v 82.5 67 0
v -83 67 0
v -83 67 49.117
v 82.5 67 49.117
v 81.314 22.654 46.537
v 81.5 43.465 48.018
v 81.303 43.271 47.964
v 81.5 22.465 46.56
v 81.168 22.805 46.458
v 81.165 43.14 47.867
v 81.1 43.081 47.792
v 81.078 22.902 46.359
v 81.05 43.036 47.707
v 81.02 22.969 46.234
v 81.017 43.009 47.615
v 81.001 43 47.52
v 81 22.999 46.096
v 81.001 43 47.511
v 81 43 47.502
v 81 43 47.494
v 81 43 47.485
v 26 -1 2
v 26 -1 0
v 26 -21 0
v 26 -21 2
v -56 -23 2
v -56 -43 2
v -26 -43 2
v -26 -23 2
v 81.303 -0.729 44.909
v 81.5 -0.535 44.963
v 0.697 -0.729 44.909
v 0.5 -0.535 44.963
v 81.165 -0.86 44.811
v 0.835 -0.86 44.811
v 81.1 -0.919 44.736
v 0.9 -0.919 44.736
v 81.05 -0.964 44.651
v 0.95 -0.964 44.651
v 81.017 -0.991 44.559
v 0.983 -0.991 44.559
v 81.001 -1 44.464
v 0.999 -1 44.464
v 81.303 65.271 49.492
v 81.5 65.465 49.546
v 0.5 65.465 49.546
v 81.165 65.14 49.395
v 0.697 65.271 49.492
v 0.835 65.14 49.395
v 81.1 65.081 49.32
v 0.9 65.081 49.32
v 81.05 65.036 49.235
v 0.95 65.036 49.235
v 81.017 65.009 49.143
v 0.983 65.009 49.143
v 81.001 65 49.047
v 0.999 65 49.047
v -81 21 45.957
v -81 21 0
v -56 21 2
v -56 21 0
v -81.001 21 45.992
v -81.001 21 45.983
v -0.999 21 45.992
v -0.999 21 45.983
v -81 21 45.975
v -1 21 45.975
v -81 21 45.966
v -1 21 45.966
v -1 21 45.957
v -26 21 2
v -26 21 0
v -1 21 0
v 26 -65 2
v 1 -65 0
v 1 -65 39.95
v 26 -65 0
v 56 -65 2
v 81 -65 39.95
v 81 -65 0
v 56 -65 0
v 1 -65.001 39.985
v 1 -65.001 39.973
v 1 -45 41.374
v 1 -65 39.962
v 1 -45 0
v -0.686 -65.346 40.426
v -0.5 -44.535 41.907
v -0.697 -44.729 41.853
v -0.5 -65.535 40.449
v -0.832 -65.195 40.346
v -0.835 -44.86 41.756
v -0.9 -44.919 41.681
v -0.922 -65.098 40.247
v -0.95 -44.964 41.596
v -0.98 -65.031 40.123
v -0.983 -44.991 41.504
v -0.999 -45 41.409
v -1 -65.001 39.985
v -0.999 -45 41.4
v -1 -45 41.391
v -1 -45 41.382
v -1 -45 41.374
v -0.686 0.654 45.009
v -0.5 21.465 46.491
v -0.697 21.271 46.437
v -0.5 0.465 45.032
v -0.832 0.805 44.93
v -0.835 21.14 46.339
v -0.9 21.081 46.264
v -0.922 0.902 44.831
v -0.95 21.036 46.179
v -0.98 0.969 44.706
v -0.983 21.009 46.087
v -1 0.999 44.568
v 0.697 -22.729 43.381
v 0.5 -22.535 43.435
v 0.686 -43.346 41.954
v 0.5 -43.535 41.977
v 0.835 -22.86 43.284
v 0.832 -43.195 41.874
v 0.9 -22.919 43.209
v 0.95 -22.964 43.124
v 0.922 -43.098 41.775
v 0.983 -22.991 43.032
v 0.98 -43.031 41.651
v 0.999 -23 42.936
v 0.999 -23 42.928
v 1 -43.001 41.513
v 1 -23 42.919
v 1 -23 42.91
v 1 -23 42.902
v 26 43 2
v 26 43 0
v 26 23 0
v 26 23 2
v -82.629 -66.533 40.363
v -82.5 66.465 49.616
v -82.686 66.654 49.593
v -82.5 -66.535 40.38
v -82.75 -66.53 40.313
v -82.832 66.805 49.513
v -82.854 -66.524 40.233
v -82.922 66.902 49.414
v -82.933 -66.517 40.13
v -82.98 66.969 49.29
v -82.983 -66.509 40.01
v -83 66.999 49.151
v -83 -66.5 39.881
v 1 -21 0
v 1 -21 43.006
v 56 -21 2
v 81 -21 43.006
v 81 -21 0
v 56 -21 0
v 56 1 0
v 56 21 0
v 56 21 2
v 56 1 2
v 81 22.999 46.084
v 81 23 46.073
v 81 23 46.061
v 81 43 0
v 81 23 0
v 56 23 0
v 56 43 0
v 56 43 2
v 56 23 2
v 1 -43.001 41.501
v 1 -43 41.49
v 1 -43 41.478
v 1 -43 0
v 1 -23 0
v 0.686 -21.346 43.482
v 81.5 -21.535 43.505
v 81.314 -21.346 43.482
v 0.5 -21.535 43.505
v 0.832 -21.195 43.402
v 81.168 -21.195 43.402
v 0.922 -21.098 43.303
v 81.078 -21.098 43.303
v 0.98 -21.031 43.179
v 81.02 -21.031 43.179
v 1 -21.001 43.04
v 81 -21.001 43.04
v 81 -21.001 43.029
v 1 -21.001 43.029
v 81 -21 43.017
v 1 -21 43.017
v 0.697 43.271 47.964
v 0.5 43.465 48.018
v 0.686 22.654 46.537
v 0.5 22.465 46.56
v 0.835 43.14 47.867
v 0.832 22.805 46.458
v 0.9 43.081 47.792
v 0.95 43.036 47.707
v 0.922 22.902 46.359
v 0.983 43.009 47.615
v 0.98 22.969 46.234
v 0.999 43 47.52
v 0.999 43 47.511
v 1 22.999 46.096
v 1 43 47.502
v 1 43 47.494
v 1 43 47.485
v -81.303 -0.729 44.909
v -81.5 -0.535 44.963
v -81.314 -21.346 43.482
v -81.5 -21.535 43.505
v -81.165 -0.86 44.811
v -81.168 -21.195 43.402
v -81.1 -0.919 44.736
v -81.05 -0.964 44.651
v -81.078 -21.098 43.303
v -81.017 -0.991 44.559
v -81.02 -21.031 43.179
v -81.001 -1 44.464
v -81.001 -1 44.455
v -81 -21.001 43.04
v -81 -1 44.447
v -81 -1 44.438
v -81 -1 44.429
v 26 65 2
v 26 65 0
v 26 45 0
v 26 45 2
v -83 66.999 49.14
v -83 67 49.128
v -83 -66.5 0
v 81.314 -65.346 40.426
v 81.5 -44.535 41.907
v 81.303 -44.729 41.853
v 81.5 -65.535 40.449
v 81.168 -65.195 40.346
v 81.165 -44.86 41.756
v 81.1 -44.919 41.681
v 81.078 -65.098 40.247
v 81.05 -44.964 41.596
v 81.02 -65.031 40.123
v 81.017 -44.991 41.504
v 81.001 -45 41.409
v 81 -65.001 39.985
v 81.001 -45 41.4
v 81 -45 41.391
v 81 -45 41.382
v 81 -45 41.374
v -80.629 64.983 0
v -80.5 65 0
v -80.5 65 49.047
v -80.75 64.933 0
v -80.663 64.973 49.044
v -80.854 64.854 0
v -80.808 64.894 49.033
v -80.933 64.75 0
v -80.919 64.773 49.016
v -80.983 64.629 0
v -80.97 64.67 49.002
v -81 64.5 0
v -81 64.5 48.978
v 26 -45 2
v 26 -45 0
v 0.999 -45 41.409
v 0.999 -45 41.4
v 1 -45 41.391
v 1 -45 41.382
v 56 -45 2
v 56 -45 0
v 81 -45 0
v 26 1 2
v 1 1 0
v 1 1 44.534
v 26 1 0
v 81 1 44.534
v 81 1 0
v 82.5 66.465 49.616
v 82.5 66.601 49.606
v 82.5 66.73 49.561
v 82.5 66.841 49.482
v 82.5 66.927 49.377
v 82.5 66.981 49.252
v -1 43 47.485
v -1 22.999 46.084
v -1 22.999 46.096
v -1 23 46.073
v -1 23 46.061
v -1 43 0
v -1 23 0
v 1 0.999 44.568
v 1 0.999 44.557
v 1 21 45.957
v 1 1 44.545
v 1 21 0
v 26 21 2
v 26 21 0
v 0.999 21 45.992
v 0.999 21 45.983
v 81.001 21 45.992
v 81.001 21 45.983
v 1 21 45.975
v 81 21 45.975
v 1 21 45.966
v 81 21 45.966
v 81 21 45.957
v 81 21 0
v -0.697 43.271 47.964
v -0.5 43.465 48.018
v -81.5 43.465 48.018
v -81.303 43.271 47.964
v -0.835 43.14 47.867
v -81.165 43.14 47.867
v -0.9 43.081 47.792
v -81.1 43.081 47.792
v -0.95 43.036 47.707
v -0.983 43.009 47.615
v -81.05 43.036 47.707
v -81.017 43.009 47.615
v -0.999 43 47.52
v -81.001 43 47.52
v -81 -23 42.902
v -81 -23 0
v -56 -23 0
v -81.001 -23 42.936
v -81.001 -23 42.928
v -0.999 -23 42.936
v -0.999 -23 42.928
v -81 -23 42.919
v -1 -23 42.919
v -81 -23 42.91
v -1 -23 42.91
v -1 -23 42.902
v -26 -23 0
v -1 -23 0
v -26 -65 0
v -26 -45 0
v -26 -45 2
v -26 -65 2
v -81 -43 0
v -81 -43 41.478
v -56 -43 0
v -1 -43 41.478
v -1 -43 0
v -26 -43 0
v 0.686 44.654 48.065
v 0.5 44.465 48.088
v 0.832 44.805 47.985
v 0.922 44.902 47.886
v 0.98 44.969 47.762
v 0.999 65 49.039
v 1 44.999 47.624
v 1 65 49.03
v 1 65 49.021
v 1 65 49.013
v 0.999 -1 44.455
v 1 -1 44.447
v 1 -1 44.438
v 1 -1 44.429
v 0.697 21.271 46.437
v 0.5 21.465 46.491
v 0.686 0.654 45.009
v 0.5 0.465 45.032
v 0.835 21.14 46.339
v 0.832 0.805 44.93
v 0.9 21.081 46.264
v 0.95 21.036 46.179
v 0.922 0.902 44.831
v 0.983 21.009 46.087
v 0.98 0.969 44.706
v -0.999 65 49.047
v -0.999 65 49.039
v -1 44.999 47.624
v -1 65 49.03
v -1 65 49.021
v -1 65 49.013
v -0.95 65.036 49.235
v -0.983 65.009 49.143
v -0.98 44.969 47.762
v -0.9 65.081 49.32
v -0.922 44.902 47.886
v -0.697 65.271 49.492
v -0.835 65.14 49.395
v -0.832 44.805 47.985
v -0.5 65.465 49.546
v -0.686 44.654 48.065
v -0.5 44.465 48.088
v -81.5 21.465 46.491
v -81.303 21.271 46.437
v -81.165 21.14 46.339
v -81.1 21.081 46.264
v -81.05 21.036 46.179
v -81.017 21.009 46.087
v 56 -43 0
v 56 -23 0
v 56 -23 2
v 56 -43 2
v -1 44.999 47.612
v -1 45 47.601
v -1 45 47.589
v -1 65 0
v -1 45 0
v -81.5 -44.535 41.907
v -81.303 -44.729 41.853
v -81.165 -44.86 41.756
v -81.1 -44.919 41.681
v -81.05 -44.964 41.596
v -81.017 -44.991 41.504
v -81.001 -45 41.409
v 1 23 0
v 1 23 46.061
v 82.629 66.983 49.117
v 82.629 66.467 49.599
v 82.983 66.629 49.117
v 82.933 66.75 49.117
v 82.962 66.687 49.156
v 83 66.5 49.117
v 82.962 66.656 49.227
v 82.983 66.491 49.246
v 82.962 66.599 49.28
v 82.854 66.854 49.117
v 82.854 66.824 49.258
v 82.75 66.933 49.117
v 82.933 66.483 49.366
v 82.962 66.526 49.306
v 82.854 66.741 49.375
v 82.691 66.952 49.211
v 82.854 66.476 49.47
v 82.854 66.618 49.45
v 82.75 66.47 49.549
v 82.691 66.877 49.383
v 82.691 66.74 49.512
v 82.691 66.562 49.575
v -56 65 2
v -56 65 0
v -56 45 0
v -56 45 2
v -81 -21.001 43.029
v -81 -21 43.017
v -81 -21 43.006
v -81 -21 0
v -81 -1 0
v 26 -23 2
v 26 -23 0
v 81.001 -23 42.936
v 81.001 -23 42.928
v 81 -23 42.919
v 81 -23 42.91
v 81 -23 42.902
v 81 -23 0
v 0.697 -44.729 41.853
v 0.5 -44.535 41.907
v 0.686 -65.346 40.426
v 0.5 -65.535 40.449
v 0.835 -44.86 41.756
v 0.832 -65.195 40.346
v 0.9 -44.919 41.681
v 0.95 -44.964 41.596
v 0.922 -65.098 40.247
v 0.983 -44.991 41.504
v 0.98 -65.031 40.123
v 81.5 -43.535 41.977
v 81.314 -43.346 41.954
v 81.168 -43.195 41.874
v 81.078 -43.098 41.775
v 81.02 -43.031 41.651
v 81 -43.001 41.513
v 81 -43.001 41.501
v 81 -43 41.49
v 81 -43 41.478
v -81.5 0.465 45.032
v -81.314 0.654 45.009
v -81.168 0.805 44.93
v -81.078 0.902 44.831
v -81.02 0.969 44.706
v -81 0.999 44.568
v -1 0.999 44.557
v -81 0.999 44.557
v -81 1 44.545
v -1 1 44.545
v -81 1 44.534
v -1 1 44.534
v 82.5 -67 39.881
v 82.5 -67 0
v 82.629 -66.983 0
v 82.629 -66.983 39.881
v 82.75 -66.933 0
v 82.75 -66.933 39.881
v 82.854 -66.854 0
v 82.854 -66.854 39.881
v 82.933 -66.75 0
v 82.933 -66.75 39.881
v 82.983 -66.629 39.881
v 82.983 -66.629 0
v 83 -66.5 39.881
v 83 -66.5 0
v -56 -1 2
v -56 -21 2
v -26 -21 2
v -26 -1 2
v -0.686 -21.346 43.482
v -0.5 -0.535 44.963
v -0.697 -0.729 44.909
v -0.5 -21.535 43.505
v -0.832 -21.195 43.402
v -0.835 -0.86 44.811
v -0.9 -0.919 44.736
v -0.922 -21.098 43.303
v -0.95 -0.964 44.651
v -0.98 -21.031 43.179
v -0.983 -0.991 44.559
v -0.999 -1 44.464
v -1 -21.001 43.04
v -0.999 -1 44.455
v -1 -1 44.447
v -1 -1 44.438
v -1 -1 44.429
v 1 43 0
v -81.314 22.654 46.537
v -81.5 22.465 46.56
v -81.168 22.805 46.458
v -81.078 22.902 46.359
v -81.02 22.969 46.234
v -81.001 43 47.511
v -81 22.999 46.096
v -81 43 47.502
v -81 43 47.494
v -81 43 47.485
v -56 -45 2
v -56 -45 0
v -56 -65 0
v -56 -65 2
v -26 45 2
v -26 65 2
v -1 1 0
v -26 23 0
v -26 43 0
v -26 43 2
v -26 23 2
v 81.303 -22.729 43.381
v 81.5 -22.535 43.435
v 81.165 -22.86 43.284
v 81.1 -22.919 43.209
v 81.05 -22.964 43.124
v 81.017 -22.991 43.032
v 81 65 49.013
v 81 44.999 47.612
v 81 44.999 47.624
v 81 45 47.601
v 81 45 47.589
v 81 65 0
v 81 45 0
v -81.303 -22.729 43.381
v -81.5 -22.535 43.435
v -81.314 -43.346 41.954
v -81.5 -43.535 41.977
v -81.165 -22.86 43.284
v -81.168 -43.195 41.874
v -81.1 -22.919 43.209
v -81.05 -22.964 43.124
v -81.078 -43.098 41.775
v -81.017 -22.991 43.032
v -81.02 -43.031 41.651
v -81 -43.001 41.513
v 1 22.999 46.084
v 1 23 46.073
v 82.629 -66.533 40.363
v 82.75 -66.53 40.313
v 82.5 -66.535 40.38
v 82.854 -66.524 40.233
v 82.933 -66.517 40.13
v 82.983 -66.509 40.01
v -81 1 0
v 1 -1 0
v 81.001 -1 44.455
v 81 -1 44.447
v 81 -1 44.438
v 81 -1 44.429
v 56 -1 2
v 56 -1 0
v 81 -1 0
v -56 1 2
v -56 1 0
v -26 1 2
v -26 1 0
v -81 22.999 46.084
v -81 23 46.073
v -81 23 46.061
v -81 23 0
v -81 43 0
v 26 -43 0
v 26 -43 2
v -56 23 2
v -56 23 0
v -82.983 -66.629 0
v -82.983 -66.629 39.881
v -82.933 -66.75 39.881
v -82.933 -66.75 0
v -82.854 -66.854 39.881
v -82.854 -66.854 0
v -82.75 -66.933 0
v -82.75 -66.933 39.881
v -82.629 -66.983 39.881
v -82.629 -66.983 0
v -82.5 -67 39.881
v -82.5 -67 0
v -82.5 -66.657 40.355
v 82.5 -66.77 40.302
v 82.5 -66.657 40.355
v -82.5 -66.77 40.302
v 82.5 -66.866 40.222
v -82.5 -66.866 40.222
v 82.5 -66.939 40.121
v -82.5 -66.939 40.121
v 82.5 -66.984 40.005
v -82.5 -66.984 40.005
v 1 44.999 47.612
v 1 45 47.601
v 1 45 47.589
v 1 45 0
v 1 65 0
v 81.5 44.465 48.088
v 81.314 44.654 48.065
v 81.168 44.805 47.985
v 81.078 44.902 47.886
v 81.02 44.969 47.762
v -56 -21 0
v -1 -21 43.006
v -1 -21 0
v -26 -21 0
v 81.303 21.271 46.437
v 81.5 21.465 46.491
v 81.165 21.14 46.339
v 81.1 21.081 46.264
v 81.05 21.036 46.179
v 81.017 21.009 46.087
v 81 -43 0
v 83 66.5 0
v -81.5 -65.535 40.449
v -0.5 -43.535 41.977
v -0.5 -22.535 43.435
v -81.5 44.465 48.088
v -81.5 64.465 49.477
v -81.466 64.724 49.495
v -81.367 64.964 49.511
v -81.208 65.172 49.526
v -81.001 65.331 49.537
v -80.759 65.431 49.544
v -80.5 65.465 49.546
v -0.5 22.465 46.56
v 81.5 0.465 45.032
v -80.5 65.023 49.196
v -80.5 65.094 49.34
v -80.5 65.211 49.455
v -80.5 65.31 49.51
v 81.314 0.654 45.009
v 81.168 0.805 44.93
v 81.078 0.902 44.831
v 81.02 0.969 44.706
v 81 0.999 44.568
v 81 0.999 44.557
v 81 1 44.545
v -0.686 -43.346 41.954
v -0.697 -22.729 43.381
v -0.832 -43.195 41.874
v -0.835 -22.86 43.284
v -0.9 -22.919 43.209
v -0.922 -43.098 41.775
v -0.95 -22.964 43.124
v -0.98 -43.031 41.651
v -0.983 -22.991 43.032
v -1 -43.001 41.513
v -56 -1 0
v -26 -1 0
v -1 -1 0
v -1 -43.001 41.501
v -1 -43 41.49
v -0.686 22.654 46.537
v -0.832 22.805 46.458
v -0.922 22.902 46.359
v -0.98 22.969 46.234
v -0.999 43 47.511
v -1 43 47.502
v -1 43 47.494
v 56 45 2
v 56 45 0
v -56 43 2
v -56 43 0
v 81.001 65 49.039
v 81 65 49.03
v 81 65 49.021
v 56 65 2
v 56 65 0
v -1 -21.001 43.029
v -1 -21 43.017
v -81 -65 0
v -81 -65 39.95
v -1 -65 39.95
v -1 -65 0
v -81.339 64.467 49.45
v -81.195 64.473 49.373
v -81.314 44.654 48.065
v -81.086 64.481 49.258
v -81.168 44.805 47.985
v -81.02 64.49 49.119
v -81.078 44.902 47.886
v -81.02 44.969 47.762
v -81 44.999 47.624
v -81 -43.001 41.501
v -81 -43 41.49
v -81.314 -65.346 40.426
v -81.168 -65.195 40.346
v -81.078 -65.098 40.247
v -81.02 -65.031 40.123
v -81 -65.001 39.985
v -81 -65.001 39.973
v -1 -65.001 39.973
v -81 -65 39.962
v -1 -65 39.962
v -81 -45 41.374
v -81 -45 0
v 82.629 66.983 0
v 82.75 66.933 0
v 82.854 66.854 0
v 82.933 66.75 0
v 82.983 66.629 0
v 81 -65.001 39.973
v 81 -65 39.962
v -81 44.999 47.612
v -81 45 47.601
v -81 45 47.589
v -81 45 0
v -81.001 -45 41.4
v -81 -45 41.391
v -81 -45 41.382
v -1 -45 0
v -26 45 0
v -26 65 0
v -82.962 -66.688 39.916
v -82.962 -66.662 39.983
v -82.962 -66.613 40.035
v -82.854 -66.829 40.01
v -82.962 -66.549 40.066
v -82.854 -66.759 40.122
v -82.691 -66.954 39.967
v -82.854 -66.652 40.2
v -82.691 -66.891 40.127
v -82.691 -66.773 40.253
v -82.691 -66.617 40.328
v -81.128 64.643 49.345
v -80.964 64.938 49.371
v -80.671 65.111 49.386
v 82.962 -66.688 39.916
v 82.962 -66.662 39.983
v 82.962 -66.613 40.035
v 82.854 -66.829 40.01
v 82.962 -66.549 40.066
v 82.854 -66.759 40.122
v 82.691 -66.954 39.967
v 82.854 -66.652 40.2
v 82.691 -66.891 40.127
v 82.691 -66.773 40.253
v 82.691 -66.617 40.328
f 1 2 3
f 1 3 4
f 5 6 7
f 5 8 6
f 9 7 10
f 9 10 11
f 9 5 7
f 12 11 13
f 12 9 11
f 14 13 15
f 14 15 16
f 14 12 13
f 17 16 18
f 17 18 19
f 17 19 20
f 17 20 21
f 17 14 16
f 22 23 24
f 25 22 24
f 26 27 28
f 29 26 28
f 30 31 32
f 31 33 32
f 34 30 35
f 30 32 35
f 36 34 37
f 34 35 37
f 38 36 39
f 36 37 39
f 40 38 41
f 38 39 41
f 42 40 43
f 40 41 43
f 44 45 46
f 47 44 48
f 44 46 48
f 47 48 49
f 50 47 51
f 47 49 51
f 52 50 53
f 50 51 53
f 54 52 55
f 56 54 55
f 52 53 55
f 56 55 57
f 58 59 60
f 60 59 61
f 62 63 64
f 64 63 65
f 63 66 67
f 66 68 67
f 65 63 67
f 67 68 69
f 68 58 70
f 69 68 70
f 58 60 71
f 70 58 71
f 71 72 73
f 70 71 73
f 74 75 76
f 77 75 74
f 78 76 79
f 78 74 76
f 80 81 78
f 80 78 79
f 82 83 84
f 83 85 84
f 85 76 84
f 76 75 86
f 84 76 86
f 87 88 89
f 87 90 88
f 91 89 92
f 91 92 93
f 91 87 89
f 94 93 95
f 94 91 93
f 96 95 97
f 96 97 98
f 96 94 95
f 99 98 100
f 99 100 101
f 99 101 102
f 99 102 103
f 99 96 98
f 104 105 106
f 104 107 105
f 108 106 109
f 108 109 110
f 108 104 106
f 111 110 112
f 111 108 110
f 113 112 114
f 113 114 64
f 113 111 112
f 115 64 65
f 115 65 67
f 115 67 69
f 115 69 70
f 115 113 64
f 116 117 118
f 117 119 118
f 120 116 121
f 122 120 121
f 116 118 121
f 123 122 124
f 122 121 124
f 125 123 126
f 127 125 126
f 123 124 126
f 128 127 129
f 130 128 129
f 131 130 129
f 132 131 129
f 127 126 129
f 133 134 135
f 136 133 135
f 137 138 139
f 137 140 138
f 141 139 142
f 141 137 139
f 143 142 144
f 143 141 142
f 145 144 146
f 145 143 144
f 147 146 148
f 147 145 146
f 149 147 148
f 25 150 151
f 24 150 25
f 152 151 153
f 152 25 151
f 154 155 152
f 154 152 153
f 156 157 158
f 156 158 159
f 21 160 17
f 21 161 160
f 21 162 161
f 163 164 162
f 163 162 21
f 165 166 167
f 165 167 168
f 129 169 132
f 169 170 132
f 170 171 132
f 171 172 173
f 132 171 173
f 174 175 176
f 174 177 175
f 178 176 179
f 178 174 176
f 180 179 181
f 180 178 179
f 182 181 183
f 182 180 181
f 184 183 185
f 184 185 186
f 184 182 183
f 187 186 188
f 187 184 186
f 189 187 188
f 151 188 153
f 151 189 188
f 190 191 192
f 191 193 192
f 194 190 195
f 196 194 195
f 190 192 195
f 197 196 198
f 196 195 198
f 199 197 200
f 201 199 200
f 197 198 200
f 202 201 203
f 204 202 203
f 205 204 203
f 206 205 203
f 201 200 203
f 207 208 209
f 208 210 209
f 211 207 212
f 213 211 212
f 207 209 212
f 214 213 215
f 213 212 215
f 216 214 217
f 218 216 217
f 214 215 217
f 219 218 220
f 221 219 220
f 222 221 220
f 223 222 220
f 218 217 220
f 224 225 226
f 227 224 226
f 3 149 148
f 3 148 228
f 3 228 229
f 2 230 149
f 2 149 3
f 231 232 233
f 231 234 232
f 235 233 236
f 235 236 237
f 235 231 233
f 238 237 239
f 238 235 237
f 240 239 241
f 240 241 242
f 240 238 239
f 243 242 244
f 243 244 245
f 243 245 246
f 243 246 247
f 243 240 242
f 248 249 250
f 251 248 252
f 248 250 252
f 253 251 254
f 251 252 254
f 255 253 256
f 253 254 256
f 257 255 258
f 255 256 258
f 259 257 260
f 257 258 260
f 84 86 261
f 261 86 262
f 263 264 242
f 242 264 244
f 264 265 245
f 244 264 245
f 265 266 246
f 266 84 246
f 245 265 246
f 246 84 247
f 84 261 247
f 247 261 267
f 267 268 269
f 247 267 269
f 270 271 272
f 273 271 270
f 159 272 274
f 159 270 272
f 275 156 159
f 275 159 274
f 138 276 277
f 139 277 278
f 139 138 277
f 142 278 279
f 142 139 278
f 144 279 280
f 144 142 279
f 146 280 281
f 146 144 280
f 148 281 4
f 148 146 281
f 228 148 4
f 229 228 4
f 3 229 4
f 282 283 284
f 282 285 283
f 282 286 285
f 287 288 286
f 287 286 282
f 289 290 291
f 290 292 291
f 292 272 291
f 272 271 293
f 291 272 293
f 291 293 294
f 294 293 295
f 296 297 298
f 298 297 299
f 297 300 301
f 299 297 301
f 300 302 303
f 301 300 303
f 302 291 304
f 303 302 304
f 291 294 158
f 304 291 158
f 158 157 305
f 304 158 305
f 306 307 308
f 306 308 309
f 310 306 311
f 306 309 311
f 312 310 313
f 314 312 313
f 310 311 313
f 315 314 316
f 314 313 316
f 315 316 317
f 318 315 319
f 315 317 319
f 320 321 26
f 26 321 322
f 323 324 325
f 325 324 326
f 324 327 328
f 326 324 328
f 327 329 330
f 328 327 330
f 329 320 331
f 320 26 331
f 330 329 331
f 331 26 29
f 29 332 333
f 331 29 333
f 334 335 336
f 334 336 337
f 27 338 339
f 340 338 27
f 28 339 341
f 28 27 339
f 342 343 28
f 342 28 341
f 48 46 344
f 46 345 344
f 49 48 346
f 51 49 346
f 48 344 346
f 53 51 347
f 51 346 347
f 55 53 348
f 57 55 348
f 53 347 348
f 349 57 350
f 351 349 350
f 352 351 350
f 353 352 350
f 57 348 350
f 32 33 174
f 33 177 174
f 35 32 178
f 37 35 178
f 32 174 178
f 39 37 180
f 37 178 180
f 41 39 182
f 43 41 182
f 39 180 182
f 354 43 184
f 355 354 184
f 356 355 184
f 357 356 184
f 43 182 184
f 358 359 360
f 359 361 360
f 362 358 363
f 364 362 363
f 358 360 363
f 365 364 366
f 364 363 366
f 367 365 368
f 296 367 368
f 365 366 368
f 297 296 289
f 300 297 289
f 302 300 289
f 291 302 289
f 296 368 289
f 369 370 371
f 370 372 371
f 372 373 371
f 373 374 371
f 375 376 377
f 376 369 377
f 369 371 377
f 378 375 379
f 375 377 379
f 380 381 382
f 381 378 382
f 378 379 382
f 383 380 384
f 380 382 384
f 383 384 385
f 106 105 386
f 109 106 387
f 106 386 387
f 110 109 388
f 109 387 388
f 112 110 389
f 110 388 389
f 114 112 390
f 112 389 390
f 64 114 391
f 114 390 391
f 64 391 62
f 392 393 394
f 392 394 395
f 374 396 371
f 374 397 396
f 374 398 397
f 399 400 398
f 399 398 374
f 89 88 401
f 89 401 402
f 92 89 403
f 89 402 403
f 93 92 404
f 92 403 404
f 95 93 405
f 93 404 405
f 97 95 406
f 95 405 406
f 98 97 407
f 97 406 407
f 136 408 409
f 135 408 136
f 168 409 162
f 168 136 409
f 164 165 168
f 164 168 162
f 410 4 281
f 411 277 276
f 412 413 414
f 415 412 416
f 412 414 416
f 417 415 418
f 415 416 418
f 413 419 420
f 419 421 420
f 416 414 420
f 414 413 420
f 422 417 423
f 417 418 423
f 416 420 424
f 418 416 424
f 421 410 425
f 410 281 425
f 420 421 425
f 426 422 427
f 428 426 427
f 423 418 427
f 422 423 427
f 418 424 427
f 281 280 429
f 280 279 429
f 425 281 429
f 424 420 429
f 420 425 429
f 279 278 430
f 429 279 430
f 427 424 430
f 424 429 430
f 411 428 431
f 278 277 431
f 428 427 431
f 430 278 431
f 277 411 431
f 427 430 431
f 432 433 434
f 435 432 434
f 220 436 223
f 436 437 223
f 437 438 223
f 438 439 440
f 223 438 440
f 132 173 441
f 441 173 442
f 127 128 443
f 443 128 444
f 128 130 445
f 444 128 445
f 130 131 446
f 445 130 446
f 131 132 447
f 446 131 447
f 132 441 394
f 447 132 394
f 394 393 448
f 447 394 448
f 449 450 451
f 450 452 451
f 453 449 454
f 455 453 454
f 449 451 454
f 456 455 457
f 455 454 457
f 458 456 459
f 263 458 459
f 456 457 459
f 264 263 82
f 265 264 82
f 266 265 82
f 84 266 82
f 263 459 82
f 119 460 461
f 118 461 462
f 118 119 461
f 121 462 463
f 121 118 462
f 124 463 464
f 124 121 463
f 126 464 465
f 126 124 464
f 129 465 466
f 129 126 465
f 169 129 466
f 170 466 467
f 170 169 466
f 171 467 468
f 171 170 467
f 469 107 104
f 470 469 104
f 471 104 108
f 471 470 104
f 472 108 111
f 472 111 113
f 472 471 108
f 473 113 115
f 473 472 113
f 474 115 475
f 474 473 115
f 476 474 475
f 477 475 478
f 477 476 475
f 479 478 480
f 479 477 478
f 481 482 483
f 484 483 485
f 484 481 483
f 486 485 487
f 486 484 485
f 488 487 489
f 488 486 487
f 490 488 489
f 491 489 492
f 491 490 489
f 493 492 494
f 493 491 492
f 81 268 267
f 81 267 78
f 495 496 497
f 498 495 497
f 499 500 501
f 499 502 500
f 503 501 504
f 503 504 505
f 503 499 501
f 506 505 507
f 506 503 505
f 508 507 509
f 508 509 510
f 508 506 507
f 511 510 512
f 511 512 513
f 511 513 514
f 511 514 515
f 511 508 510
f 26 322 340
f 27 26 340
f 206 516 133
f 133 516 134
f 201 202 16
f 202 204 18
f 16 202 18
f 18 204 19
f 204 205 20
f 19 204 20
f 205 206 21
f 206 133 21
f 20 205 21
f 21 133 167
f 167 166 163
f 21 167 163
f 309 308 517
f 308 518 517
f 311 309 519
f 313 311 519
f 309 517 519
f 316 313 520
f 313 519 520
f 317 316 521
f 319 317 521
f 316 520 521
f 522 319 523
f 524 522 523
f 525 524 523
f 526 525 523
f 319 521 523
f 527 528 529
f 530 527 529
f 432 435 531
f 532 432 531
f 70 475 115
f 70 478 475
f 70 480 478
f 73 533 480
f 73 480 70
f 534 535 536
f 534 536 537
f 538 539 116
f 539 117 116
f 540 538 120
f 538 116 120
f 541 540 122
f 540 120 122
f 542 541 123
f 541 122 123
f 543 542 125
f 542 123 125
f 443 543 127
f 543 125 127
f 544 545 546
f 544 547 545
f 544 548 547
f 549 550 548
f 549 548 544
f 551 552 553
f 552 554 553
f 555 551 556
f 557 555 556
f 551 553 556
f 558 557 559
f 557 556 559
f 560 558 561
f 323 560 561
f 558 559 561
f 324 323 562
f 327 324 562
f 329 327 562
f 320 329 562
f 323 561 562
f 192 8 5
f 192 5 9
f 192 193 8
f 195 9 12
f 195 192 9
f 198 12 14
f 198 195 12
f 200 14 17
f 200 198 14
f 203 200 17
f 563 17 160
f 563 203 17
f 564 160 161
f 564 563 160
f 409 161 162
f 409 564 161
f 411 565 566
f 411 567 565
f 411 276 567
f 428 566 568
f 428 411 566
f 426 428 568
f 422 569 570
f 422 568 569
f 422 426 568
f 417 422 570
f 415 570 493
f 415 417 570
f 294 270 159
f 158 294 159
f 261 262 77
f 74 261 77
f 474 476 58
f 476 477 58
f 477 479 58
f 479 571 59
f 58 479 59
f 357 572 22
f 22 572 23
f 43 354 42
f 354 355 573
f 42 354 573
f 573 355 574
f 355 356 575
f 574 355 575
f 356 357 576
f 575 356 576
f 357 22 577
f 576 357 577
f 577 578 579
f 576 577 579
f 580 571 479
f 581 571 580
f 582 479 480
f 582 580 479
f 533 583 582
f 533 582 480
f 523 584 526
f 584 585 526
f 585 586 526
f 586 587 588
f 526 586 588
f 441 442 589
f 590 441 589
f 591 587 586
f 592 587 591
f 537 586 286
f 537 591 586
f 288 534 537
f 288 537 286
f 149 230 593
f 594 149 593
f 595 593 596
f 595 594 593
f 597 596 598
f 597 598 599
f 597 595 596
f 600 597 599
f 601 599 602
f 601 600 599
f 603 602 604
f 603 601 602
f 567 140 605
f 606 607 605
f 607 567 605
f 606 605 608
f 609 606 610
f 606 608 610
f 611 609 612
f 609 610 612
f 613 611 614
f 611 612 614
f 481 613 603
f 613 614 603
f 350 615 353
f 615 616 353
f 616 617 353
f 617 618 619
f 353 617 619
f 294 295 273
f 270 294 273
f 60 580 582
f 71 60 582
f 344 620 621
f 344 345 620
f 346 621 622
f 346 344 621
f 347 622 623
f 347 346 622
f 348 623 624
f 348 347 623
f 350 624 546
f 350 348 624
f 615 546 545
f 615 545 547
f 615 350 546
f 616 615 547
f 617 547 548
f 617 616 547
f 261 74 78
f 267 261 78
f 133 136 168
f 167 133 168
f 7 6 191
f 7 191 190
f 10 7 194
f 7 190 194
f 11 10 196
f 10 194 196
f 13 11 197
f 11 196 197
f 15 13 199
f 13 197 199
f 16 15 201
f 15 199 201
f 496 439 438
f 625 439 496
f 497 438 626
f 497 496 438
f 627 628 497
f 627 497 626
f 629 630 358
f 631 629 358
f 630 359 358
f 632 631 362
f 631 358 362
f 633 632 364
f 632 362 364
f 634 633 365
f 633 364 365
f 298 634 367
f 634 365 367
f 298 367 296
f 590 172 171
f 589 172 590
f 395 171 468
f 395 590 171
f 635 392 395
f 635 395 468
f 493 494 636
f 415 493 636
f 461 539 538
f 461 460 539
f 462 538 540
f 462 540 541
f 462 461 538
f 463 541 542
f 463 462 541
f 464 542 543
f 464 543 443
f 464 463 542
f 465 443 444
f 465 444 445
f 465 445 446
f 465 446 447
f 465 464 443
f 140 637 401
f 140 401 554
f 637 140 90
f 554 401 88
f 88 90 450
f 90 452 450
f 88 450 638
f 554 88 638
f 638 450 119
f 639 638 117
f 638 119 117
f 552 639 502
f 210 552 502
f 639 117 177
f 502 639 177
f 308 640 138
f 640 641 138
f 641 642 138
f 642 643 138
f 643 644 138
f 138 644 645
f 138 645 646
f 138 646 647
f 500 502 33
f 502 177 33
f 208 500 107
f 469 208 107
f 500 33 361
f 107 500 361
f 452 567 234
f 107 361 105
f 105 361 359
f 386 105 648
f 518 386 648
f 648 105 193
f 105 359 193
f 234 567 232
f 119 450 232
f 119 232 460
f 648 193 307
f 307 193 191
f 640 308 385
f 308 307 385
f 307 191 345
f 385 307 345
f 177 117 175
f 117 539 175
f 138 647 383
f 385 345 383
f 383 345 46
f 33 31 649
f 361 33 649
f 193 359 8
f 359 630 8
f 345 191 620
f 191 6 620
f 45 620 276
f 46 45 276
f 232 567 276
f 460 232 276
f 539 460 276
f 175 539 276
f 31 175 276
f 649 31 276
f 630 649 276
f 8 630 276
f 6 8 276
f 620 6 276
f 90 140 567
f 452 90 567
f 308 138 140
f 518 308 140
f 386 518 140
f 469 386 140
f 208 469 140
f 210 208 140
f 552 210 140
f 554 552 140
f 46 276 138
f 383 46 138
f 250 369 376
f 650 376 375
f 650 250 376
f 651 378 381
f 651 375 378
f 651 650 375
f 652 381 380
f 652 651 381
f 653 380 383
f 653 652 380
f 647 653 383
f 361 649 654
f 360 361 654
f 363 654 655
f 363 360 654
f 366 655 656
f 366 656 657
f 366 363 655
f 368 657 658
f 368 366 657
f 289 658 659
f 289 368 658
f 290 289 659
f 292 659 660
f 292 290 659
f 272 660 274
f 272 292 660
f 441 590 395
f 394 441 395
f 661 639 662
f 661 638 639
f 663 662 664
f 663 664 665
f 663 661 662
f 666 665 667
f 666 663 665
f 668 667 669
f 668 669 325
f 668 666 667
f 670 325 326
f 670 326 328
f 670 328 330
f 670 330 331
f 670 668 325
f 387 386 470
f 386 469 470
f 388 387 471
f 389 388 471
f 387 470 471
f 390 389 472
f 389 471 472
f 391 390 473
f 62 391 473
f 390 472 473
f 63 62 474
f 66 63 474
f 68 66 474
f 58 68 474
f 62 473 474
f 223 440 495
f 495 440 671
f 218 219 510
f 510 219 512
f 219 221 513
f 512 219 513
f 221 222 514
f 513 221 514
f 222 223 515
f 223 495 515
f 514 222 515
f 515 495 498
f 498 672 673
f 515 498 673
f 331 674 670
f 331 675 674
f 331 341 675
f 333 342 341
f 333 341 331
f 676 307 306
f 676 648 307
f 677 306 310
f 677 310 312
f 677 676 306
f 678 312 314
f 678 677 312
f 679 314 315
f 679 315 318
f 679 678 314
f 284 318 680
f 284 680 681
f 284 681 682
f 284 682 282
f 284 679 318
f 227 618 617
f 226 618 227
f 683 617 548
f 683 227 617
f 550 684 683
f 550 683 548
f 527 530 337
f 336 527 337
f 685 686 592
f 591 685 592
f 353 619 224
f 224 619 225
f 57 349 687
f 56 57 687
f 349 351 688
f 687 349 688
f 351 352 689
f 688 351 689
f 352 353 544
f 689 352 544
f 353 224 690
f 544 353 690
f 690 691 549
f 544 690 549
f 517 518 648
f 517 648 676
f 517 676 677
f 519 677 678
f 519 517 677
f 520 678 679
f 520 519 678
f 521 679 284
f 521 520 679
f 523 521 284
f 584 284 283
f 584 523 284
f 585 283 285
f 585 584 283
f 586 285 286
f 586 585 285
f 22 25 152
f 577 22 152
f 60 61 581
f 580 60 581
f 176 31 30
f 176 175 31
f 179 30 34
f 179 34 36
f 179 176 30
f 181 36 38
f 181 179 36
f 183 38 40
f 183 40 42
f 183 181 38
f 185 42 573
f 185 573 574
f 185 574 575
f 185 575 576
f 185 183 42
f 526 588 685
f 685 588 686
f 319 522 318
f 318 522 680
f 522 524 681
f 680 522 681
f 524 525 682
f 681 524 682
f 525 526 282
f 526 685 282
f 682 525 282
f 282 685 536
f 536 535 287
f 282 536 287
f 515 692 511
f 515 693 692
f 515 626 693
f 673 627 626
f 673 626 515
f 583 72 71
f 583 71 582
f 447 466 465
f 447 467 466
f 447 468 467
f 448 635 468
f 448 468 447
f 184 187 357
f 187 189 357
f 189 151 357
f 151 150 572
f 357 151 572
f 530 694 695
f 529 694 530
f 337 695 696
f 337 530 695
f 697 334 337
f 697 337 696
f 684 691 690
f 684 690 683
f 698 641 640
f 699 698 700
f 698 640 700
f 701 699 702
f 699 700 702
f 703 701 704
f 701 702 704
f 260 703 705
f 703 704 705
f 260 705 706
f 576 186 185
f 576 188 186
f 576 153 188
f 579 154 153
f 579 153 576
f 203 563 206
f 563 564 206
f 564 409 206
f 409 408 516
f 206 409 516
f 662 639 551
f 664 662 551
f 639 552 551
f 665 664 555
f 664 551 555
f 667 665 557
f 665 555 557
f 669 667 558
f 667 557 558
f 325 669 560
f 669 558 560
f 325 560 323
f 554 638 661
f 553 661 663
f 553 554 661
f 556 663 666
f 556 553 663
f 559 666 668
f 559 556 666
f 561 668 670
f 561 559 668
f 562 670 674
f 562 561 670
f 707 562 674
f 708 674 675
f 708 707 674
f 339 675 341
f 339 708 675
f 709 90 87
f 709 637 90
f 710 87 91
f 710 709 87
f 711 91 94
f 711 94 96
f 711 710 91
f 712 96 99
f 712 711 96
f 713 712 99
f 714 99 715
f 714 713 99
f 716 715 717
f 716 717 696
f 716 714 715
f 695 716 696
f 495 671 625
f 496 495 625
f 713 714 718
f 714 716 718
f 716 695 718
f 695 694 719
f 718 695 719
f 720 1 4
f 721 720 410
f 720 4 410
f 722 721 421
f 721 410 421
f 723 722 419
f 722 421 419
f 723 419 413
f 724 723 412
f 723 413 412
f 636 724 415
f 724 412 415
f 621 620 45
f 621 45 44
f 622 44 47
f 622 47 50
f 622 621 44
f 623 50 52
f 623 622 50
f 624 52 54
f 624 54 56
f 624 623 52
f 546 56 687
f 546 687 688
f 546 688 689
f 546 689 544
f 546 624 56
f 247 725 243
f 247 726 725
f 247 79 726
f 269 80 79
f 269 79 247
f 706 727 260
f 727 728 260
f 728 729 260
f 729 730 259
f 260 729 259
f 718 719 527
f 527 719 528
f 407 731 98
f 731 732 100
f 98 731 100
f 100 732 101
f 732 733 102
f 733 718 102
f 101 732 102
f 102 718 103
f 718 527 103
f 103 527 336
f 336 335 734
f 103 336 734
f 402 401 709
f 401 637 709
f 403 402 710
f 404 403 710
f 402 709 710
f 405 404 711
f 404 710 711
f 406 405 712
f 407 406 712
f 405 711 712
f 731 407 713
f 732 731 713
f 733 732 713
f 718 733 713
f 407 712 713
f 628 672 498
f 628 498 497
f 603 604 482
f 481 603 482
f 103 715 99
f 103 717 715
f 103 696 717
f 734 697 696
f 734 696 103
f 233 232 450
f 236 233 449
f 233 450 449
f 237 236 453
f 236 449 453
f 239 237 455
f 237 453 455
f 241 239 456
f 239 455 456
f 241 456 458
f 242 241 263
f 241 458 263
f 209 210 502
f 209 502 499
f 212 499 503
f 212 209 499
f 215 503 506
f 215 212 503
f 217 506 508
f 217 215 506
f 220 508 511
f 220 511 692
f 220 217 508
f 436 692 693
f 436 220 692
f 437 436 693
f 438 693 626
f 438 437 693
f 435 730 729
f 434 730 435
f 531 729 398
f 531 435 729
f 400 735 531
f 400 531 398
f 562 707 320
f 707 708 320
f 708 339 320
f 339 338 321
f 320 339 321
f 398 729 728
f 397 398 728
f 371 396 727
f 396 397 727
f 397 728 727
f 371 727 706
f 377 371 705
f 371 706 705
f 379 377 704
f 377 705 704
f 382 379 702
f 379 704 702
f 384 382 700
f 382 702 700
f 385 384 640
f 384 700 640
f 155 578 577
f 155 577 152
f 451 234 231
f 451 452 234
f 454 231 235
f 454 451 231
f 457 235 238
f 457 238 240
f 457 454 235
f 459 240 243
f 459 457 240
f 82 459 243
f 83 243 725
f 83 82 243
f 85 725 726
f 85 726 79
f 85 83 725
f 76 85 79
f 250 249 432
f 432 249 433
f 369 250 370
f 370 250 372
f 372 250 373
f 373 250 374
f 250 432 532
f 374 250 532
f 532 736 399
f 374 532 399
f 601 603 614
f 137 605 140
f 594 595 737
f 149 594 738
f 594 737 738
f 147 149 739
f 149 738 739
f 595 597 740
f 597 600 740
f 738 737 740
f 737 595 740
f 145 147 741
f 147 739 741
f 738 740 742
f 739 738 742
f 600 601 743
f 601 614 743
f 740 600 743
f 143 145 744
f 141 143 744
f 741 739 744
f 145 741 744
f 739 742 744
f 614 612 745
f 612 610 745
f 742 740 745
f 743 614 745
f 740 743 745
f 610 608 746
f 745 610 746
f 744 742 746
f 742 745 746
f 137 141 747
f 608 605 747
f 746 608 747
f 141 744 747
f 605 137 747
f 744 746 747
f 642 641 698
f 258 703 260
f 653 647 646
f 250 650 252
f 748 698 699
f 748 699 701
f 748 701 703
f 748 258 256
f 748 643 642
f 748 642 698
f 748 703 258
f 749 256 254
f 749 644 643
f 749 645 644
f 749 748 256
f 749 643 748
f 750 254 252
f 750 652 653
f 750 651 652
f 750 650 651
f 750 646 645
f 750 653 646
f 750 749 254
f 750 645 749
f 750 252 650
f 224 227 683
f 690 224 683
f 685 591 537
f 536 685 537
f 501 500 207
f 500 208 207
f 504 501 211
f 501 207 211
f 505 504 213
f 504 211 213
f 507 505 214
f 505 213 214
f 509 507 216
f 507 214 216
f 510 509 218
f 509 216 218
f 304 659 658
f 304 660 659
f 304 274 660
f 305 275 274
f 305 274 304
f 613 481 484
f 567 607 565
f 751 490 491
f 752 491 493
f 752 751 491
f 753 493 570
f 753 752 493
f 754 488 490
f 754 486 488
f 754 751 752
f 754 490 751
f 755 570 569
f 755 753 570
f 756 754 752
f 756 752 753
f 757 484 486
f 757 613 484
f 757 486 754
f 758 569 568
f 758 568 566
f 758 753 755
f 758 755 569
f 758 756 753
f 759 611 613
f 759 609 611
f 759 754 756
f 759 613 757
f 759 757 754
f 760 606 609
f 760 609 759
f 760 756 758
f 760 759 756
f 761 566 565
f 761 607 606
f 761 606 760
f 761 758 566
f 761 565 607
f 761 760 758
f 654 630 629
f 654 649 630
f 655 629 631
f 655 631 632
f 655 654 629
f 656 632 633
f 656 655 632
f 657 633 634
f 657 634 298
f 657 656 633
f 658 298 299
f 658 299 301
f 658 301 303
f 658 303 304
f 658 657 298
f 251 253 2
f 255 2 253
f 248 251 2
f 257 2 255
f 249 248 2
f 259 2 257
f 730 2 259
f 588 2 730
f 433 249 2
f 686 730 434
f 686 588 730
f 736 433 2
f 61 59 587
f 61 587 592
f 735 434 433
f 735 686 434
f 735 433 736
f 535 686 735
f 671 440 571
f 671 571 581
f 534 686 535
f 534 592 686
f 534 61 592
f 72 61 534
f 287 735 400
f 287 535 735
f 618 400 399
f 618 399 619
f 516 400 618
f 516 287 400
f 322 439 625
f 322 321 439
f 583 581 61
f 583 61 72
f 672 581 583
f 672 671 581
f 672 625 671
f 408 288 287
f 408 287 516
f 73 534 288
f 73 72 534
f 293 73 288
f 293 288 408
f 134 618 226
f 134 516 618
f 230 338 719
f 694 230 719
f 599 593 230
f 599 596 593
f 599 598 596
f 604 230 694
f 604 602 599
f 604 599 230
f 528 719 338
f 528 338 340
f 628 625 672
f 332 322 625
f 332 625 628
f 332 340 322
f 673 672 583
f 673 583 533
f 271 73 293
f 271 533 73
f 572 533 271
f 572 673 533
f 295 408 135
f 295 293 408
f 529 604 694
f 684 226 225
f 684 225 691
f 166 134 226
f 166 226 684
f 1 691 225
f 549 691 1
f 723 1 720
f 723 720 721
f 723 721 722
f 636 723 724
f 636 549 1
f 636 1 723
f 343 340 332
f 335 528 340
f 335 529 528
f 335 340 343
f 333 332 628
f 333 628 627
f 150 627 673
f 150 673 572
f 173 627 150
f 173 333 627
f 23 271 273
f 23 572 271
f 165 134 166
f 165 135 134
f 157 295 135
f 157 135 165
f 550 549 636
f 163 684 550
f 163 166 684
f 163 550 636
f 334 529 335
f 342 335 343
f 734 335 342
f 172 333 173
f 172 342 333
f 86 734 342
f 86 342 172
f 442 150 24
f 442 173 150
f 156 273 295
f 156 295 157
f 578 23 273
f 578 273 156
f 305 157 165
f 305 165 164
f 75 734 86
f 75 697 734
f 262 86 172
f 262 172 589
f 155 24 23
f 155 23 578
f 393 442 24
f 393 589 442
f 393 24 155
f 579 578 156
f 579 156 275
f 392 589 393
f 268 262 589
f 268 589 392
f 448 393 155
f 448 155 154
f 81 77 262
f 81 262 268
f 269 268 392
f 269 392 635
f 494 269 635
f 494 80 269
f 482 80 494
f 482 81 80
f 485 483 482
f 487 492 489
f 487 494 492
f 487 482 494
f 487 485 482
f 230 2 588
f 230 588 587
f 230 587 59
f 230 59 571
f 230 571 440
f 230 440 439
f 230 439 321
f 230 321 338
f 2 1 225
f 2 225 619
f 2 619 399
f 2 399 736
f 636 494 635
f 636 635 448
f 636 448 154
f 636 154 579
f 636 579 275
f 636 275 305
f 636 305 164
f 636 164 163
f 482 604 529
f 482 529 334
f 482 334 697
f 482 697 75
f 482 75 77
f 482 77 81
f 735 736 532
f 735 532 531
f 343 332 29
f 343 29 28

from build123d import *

# Parameters (mm, degrees)
SKETCH_W     = 166
SKETCH_H     = 134
SKETCH_W_2   = 80
SKETCH_H_2   = 20
PAD_DEPTH    = 50
POCKET_DEPTH = 166.001
SKETCH002_W  = 30
SKETCH002_H  = 130
PAD001_DEPTH = 2
FILLET_R     = 0.5


with BuildPart() as part:
    # Sketch → Pad (new body)
    with BuildSketch(Plane.XY):
        Rectangle(SKETCH_W, SKETCH_H)
        with Locations((-41, -55)):
            Rectangle(SKETCH_W_2, SKETCH_H_2, mode=Mode.SUBTRACT)
        with Locations((-41, -33)):
            Rectangle(SKETCH_W_2, SKETCH_H_2, mode=Mode.SUBTRACT)
        with Locations((-41, -11)):
            Rectangle(SKETCH_W_2, SKETCH_H_2, mode=Mode.SUBTRACT)
        with Locations((-41, 11)):
            Rectangle(SKETCH_W_2, SKETCH_H_2, mode=Mode.SUBTRACT)
        with Locations((-41, 33)):
            Rectangle(SKETCH_W_2, SKETCH_H_2, mode=Mode.SUBTRACT)
        with Locations((-41, 55)):
            Rectangle(SKETCH_W_2, SKETCH_H_2, mode=Mode.SUBTRACT)
        with Locations((41, 55)):
            Rectangle(SKETCH_W_2, SKETCH_H_2, mode=Mode.SUBTRACT)
        with Locations((41, 33)):
            Rectangle(SKETCH_W_2, SKETCH_H_2, mode=Mode.SUBTRACT)
        with Locations((41, 11)):
            Rectangle(SKETCH_W_2, SKETCH_H_2, mode=Mode.SUBTRACT)
        with Locations((41, -11)):
            Rectangle(SKETCH_W_2, SKETCH_H_2, mode=Mode.SUBTRACT)
        with Locations((41, -33)):
            Rectangle(SKETCH_W_2, SKETCH_H_2, mode=Mode.SUBTRACT)
        with Locations((41, -55)):
            Rectangle(SKETCH_W_2, SKETCH_H_2, mode=Mode.SUBTRACT)
    extrude(amount=PAD_DEPTH)

    # Sketch001 (on Face2 of Pad) → Pocket (cut, through all)
    with BuildSketch(Plane.YZ.offset(83)):
        Polygon((-72, 40), (72, 50), (72, 60), (-72, 60), align=None)
    extrude(amount=-POCKET_DEPTH, mode=Mode.SUBTRACT)

    # Sketch002 (on Face2 of Pocket) → Pad001 (join)
    with BuildSketch(Plane(origin=(0, 0, 0), x_dir=(1, 0, 0), z_dir=(0, 0, -1))):
        with Locations((-41, 0)):
            Rectangle(SKETCH002_W, SKETCH002_H)
        with Locations((41, 0)):
            Rectangle(SKETCH002_W, SKETCH002_H)
    extrude(amount=-PAD001_DEPTH)

    # Fillet
    fillet_edges = [part.edges().sort_by_distance(p)[0] for p in [
        (83, 0, 45),
        (0, 67, 49.652778),
        (-83, 0, 45),
        (0, -67, 40.347222),
        (-41, -65, 40.486111),
        (-81, -55, 41.180556),
        (-41, -45, 41.875),
        (-1, -55, 41.180556),
        (-81, -33, 42.708333),
        (-41, -23, 43.402778),
        (-1, -33, 42.708333),
        (-41, -43, 42.013889),
        (-81, -11, 44.236111),
        (-41, -1, 44.930556),
        (-1, -11, 44.236111),
        (-41, -21, 43.541667),
        (-81, 11, 45.763889),
        (-41, 21, 46.458333),
        (-1, 11, 45.763889),
        (-41, 1, 45.069444),
        (-81, 33, 47.291667),
        (-41, 43, 47.986111),
        (-1, 33, 47.291667),
        (-41, 23, 46.597222),
        (-81, 55, 48.819444),
        (-41, 65, 49.513889),
        (-1, 55, 48.819444),
        (-41, 45, 48.125),
        (81, -55, 41.180556),
        (41, -65, 40.486111),
        (1, -55, 41.180556),
        (41, -45, 41.875),
        (81, -33, 42.708333),
        (41, -43, 42.013889),
        (1, -33, 42.708333),
        (41, -23, 43.402778),
        (81, -11, 44.236111),
        (41, -21, 43.541667),
        (1, -11, 44.236111),
        (41, -1, 44.930556),
        (81, 11, 45.763889),
        (41, 1, 45.069444),
        (1, 11, 45.763889),
        (41, 21, 46.458333),
        (81, 33, 47.291667),
        (41, 23, 46.597222),
        (1, 33, 47.291667),
        (41, 43, 47.986111),
        (81, 55, 48.819444),
        (41, 45, 48.125),
        (1, 55, 48.819444),
        (41, 65, 49.513889),
        (-83, -67, 20.173611),
        (83, 67, 24.826389),
        (-81, 65, 24.756944),
        (83, -67, 20.173611),
    ]]
    fillet(fillet_edges, radius=FILLET_R)


solid = part.part
